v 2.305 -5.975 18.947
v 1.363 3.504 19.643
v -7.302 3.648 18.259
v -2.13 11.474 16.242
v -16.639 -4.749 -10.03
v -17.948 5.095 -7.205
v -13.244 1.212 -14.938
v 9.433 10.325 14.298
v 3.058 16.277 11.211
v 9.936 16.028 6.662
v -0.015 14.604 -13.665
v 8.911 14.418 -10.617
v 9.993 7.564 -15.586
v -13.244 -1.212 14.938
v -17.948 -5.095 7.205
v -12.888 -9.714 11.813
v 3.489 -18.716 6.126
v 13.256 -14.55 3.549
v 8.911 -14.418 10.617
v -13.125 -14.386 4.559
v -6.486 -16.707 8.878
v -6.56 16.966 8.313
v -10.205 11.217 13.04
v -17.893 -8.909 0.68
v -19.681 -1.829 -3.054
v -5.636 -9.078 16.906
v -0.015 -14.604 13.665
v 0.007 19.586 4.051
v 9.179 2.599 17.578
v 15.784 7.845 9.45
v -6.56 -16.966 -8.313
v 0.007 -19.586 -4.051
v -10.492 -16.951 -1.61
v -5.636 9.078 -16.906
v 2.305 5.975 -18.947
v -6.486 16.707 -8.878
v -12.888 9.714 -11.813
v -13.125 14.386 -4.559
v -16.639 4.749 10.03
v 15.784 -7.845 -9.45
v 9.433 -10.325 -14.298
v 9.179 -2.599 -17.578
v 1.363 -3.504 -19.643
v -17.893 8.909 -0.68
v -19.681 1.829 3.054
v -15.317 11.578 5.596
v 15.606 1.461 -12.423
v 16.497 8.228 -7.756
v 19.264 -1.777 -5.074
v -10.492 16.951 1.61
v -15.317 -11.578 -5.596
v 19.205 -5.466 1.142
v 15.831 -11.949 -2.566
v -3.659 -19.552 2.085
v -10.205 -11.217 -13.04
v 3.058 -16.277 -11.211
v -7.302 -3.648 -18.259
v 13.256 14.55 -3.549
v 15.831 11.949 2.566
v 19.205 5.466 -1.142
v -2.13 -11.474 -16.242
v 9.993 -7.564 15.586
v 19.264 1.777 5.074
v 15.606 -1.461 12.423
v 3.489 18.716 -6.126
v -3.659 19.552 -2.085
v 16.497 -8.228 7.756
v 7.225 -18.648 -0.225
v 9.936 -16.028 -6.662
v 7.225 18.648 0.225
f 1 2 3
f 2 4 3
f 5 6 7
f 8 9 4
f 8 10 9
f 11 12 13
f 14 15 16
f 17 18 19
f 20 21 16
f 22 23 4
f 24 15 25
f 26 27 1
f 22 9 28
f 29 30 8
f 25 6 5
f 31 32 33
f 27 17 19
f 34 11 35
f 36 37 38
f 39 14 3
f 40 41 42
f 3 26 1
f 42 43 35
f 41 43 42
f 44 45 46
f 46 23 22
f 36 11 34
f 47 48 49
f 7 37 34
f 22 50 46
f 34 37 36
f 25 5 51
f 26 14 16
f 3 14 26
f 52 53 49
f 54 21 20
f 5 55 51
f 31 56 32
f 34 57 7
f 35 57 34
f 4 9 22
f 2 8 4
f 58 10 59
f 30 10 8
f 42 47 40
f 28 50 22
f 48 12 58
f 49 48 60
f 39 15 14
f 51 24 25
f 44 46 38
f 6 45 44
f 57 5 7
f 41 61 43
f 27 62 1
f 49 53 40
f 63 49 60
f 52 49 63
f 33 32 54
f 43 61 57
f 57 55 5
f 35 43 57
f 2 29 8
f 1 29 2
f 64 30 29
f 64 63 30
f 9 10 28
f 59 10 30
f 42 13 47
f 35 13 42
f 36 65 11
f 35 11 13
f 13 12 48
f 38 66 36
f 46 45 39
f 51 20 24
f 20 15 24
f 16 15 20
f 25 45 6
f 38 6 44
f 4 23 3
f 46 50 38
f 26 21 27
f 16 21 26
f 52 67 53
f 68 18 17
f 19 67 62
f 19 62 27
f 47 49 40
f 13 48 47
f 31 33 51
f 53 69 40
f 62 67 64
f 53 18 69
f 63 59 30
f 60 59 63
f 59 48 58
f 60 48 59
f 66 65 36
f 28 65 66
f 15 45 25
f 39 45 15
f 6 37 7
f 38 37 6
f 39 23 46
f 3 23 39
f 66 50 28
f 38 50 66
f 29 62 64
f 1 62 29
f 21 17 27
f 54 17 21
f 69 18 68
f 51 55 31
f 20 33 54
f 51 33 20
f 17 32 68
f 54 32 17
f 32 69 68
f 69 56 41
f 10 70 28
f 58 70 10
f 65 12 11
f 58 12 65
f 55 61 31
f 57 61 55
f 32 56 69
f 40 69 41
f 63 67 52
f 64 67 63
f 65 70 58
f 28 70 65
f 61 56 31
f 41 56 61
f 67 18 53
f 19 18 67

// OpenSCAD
/*
A New Computationally Efficient Method for Spacing n Points on 
a Sphere - Jonathan Kogan  */
function sphericalcoordinate(x,y)=  [cos(x  )*cos(y  ), sin(x  )*cos(y  ), sin(y  )];
function NX(n,x)= 
let(PI=acos(-1)/57.2958,toDeg=57.2958,
start=(-1.+1./(n-1.)),increment=(2.-2./(n-1.))/(n-1.) )
[ for (j= [0:n-1])let (s=start+j*increment )
 sphericalcoordinate(   s*x*toDeg,  PI/2.* sign(s)*(1.-sqrt(1.-abs(s)))*toDeg)];
function generatepoints(n)= NX(n,0.1+1.2*n);
module isosphere(r,detail){
a= generatepoints(detail);
scale(20)hull()polyhedron(a,[[for(i=[0:len(a)-1])i]]);
}
    isosphere(20,70);
 
    
